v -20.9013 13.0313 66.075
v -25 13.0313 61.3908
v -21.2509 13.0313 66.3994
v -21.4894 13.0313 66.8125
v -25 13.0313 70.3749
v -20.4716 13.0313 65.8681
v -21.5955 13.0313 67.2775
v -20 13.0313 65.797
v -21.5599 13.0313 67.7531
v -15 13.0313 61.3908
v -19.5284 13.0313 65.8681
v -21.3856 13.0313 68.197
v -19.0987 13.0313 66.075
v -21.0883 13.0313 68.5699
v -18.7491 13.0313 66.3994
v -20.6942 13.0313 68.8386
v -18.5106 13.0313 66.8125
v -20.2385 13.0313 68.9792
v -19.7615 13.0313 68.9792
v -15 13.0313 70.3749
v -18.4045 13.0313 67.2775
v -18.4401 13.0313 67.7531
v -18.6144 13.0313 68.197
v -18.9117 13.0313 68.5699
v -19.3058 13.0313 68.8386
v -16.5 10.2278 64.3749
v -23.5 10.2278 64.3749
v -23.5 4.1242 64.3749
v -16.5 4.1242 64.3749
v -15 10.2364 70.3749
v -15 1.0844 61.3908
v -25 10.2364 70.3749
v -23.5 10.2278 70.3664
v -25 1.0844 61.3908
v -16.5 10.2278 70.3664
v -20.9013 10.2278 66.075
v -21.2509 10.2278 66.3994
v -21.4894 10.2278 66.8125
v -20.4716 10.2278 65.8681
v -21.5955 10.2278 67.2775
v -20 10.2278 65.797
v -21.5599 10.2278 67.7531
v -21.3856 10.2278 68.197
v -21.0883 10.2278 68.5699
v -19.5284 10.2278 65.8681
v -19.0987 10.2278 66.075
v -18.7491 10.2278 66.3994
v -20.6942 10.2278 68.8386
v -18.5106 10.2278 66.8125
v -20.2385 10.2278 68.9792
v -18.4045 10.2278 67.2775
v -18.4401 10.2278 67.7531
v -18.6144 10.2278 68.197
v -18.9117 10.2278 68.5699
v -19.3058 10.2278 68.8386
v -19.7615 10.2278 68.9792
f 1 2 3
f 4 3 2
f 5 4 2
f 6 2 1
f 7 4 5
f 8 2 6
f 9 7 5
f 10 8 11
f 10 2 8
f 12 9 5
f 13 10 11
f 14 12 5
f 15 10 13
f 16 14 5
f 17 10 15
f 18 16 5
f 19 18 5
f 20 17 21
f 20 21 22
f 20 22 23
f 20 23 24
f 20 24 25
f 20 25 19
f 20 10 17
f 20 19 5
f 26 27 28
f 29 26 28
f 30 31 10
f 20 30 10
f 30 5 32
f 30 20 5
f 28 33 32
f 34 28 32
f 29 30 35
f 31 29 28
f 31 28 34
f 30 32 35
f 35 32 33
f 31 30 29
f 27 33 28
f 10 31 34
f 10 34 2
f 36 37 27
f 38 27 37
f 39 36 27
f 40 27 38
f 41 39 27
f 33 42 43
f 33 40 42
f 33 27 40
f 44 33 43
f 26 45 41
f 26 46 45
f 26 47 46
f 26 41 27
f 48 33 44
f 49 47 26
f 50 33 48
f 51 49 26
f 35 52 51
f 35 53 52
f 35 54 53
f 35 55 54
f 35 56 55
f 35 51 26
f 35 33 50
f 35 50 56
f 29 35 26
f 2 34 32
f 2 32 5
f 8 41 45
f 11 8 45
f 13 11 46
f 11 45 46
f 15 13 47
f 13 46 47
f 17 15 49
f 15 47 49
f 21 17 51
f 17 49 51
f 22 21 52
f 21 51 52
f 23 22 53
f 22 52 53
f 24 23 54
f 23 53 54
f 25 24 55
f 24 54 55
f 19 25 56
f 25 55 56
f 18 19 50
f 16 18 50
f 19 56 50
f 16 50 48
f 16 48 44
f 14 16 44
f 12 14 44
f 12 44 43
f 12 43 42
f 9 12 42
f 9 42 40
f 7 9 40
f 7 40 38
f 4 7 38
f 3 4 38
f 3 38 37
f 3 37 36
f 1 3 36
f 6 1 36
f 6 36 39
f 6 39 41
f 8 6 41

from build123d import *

# Parameters (mm, degrees)
PAD019_DEPTH    = 5
SKETCH047_W     = 7.74745
SKETCH047_H     = 7
POCKET015_DEPTH = 7
SKETCH048_R     = 1.6
POCKET016_DEPTH = 5


with BuildPart() as part:
    # Sketch046 → Pad019 (new body, symmetric)
    with BuildSketch(Plane.YZ):
        Polygon((13.031275, 70.374863), (10.236371, 70.374863), (1.084429, 61.39085), (13.031275, 61.39085), align=None)
    extrude(amount=PAD019_DEPTH, both=True)

    # Sketch047 (on DatumPlane) → Pocket015 (cut)
    with BuildSketch(Plane(origin=(0, 0, 71.374863), x_dir=(0, -1, 0), z_dir=(0, 0, 1))):
        with Locations((-6.354073, 0)):
            Rectangle(SKETCH047_W, SKETCH047_H)
    extrude(amount=-POCKET015_DEPTH, mode=Mode.SUBTRACT)

    # Sketch048 (on Face9 of Pocket015) → Pocket016 (cut)
    with BuildSketch(Plane(origin=(0, 10.227798, 0), x_dir=(0, 0, -1), z_dir=(0, -1, 0))):
        with Locations((-67.397021, 0)):
            Circle(SKETCH048_R)
    extrude(amount=-POCKET016_DEPTH, mode=Mode.SUBTRACT)


with BuildPart() as part_1:
    # Body021 placement: moved
    add(part.part.moved(Location((20, 0, 0))))


with BuildPart() as part_2:
    # Body022 placement: moved
    add(part_1.part.moved(Location((-40, 0, 0))))


solid = part_2.part
